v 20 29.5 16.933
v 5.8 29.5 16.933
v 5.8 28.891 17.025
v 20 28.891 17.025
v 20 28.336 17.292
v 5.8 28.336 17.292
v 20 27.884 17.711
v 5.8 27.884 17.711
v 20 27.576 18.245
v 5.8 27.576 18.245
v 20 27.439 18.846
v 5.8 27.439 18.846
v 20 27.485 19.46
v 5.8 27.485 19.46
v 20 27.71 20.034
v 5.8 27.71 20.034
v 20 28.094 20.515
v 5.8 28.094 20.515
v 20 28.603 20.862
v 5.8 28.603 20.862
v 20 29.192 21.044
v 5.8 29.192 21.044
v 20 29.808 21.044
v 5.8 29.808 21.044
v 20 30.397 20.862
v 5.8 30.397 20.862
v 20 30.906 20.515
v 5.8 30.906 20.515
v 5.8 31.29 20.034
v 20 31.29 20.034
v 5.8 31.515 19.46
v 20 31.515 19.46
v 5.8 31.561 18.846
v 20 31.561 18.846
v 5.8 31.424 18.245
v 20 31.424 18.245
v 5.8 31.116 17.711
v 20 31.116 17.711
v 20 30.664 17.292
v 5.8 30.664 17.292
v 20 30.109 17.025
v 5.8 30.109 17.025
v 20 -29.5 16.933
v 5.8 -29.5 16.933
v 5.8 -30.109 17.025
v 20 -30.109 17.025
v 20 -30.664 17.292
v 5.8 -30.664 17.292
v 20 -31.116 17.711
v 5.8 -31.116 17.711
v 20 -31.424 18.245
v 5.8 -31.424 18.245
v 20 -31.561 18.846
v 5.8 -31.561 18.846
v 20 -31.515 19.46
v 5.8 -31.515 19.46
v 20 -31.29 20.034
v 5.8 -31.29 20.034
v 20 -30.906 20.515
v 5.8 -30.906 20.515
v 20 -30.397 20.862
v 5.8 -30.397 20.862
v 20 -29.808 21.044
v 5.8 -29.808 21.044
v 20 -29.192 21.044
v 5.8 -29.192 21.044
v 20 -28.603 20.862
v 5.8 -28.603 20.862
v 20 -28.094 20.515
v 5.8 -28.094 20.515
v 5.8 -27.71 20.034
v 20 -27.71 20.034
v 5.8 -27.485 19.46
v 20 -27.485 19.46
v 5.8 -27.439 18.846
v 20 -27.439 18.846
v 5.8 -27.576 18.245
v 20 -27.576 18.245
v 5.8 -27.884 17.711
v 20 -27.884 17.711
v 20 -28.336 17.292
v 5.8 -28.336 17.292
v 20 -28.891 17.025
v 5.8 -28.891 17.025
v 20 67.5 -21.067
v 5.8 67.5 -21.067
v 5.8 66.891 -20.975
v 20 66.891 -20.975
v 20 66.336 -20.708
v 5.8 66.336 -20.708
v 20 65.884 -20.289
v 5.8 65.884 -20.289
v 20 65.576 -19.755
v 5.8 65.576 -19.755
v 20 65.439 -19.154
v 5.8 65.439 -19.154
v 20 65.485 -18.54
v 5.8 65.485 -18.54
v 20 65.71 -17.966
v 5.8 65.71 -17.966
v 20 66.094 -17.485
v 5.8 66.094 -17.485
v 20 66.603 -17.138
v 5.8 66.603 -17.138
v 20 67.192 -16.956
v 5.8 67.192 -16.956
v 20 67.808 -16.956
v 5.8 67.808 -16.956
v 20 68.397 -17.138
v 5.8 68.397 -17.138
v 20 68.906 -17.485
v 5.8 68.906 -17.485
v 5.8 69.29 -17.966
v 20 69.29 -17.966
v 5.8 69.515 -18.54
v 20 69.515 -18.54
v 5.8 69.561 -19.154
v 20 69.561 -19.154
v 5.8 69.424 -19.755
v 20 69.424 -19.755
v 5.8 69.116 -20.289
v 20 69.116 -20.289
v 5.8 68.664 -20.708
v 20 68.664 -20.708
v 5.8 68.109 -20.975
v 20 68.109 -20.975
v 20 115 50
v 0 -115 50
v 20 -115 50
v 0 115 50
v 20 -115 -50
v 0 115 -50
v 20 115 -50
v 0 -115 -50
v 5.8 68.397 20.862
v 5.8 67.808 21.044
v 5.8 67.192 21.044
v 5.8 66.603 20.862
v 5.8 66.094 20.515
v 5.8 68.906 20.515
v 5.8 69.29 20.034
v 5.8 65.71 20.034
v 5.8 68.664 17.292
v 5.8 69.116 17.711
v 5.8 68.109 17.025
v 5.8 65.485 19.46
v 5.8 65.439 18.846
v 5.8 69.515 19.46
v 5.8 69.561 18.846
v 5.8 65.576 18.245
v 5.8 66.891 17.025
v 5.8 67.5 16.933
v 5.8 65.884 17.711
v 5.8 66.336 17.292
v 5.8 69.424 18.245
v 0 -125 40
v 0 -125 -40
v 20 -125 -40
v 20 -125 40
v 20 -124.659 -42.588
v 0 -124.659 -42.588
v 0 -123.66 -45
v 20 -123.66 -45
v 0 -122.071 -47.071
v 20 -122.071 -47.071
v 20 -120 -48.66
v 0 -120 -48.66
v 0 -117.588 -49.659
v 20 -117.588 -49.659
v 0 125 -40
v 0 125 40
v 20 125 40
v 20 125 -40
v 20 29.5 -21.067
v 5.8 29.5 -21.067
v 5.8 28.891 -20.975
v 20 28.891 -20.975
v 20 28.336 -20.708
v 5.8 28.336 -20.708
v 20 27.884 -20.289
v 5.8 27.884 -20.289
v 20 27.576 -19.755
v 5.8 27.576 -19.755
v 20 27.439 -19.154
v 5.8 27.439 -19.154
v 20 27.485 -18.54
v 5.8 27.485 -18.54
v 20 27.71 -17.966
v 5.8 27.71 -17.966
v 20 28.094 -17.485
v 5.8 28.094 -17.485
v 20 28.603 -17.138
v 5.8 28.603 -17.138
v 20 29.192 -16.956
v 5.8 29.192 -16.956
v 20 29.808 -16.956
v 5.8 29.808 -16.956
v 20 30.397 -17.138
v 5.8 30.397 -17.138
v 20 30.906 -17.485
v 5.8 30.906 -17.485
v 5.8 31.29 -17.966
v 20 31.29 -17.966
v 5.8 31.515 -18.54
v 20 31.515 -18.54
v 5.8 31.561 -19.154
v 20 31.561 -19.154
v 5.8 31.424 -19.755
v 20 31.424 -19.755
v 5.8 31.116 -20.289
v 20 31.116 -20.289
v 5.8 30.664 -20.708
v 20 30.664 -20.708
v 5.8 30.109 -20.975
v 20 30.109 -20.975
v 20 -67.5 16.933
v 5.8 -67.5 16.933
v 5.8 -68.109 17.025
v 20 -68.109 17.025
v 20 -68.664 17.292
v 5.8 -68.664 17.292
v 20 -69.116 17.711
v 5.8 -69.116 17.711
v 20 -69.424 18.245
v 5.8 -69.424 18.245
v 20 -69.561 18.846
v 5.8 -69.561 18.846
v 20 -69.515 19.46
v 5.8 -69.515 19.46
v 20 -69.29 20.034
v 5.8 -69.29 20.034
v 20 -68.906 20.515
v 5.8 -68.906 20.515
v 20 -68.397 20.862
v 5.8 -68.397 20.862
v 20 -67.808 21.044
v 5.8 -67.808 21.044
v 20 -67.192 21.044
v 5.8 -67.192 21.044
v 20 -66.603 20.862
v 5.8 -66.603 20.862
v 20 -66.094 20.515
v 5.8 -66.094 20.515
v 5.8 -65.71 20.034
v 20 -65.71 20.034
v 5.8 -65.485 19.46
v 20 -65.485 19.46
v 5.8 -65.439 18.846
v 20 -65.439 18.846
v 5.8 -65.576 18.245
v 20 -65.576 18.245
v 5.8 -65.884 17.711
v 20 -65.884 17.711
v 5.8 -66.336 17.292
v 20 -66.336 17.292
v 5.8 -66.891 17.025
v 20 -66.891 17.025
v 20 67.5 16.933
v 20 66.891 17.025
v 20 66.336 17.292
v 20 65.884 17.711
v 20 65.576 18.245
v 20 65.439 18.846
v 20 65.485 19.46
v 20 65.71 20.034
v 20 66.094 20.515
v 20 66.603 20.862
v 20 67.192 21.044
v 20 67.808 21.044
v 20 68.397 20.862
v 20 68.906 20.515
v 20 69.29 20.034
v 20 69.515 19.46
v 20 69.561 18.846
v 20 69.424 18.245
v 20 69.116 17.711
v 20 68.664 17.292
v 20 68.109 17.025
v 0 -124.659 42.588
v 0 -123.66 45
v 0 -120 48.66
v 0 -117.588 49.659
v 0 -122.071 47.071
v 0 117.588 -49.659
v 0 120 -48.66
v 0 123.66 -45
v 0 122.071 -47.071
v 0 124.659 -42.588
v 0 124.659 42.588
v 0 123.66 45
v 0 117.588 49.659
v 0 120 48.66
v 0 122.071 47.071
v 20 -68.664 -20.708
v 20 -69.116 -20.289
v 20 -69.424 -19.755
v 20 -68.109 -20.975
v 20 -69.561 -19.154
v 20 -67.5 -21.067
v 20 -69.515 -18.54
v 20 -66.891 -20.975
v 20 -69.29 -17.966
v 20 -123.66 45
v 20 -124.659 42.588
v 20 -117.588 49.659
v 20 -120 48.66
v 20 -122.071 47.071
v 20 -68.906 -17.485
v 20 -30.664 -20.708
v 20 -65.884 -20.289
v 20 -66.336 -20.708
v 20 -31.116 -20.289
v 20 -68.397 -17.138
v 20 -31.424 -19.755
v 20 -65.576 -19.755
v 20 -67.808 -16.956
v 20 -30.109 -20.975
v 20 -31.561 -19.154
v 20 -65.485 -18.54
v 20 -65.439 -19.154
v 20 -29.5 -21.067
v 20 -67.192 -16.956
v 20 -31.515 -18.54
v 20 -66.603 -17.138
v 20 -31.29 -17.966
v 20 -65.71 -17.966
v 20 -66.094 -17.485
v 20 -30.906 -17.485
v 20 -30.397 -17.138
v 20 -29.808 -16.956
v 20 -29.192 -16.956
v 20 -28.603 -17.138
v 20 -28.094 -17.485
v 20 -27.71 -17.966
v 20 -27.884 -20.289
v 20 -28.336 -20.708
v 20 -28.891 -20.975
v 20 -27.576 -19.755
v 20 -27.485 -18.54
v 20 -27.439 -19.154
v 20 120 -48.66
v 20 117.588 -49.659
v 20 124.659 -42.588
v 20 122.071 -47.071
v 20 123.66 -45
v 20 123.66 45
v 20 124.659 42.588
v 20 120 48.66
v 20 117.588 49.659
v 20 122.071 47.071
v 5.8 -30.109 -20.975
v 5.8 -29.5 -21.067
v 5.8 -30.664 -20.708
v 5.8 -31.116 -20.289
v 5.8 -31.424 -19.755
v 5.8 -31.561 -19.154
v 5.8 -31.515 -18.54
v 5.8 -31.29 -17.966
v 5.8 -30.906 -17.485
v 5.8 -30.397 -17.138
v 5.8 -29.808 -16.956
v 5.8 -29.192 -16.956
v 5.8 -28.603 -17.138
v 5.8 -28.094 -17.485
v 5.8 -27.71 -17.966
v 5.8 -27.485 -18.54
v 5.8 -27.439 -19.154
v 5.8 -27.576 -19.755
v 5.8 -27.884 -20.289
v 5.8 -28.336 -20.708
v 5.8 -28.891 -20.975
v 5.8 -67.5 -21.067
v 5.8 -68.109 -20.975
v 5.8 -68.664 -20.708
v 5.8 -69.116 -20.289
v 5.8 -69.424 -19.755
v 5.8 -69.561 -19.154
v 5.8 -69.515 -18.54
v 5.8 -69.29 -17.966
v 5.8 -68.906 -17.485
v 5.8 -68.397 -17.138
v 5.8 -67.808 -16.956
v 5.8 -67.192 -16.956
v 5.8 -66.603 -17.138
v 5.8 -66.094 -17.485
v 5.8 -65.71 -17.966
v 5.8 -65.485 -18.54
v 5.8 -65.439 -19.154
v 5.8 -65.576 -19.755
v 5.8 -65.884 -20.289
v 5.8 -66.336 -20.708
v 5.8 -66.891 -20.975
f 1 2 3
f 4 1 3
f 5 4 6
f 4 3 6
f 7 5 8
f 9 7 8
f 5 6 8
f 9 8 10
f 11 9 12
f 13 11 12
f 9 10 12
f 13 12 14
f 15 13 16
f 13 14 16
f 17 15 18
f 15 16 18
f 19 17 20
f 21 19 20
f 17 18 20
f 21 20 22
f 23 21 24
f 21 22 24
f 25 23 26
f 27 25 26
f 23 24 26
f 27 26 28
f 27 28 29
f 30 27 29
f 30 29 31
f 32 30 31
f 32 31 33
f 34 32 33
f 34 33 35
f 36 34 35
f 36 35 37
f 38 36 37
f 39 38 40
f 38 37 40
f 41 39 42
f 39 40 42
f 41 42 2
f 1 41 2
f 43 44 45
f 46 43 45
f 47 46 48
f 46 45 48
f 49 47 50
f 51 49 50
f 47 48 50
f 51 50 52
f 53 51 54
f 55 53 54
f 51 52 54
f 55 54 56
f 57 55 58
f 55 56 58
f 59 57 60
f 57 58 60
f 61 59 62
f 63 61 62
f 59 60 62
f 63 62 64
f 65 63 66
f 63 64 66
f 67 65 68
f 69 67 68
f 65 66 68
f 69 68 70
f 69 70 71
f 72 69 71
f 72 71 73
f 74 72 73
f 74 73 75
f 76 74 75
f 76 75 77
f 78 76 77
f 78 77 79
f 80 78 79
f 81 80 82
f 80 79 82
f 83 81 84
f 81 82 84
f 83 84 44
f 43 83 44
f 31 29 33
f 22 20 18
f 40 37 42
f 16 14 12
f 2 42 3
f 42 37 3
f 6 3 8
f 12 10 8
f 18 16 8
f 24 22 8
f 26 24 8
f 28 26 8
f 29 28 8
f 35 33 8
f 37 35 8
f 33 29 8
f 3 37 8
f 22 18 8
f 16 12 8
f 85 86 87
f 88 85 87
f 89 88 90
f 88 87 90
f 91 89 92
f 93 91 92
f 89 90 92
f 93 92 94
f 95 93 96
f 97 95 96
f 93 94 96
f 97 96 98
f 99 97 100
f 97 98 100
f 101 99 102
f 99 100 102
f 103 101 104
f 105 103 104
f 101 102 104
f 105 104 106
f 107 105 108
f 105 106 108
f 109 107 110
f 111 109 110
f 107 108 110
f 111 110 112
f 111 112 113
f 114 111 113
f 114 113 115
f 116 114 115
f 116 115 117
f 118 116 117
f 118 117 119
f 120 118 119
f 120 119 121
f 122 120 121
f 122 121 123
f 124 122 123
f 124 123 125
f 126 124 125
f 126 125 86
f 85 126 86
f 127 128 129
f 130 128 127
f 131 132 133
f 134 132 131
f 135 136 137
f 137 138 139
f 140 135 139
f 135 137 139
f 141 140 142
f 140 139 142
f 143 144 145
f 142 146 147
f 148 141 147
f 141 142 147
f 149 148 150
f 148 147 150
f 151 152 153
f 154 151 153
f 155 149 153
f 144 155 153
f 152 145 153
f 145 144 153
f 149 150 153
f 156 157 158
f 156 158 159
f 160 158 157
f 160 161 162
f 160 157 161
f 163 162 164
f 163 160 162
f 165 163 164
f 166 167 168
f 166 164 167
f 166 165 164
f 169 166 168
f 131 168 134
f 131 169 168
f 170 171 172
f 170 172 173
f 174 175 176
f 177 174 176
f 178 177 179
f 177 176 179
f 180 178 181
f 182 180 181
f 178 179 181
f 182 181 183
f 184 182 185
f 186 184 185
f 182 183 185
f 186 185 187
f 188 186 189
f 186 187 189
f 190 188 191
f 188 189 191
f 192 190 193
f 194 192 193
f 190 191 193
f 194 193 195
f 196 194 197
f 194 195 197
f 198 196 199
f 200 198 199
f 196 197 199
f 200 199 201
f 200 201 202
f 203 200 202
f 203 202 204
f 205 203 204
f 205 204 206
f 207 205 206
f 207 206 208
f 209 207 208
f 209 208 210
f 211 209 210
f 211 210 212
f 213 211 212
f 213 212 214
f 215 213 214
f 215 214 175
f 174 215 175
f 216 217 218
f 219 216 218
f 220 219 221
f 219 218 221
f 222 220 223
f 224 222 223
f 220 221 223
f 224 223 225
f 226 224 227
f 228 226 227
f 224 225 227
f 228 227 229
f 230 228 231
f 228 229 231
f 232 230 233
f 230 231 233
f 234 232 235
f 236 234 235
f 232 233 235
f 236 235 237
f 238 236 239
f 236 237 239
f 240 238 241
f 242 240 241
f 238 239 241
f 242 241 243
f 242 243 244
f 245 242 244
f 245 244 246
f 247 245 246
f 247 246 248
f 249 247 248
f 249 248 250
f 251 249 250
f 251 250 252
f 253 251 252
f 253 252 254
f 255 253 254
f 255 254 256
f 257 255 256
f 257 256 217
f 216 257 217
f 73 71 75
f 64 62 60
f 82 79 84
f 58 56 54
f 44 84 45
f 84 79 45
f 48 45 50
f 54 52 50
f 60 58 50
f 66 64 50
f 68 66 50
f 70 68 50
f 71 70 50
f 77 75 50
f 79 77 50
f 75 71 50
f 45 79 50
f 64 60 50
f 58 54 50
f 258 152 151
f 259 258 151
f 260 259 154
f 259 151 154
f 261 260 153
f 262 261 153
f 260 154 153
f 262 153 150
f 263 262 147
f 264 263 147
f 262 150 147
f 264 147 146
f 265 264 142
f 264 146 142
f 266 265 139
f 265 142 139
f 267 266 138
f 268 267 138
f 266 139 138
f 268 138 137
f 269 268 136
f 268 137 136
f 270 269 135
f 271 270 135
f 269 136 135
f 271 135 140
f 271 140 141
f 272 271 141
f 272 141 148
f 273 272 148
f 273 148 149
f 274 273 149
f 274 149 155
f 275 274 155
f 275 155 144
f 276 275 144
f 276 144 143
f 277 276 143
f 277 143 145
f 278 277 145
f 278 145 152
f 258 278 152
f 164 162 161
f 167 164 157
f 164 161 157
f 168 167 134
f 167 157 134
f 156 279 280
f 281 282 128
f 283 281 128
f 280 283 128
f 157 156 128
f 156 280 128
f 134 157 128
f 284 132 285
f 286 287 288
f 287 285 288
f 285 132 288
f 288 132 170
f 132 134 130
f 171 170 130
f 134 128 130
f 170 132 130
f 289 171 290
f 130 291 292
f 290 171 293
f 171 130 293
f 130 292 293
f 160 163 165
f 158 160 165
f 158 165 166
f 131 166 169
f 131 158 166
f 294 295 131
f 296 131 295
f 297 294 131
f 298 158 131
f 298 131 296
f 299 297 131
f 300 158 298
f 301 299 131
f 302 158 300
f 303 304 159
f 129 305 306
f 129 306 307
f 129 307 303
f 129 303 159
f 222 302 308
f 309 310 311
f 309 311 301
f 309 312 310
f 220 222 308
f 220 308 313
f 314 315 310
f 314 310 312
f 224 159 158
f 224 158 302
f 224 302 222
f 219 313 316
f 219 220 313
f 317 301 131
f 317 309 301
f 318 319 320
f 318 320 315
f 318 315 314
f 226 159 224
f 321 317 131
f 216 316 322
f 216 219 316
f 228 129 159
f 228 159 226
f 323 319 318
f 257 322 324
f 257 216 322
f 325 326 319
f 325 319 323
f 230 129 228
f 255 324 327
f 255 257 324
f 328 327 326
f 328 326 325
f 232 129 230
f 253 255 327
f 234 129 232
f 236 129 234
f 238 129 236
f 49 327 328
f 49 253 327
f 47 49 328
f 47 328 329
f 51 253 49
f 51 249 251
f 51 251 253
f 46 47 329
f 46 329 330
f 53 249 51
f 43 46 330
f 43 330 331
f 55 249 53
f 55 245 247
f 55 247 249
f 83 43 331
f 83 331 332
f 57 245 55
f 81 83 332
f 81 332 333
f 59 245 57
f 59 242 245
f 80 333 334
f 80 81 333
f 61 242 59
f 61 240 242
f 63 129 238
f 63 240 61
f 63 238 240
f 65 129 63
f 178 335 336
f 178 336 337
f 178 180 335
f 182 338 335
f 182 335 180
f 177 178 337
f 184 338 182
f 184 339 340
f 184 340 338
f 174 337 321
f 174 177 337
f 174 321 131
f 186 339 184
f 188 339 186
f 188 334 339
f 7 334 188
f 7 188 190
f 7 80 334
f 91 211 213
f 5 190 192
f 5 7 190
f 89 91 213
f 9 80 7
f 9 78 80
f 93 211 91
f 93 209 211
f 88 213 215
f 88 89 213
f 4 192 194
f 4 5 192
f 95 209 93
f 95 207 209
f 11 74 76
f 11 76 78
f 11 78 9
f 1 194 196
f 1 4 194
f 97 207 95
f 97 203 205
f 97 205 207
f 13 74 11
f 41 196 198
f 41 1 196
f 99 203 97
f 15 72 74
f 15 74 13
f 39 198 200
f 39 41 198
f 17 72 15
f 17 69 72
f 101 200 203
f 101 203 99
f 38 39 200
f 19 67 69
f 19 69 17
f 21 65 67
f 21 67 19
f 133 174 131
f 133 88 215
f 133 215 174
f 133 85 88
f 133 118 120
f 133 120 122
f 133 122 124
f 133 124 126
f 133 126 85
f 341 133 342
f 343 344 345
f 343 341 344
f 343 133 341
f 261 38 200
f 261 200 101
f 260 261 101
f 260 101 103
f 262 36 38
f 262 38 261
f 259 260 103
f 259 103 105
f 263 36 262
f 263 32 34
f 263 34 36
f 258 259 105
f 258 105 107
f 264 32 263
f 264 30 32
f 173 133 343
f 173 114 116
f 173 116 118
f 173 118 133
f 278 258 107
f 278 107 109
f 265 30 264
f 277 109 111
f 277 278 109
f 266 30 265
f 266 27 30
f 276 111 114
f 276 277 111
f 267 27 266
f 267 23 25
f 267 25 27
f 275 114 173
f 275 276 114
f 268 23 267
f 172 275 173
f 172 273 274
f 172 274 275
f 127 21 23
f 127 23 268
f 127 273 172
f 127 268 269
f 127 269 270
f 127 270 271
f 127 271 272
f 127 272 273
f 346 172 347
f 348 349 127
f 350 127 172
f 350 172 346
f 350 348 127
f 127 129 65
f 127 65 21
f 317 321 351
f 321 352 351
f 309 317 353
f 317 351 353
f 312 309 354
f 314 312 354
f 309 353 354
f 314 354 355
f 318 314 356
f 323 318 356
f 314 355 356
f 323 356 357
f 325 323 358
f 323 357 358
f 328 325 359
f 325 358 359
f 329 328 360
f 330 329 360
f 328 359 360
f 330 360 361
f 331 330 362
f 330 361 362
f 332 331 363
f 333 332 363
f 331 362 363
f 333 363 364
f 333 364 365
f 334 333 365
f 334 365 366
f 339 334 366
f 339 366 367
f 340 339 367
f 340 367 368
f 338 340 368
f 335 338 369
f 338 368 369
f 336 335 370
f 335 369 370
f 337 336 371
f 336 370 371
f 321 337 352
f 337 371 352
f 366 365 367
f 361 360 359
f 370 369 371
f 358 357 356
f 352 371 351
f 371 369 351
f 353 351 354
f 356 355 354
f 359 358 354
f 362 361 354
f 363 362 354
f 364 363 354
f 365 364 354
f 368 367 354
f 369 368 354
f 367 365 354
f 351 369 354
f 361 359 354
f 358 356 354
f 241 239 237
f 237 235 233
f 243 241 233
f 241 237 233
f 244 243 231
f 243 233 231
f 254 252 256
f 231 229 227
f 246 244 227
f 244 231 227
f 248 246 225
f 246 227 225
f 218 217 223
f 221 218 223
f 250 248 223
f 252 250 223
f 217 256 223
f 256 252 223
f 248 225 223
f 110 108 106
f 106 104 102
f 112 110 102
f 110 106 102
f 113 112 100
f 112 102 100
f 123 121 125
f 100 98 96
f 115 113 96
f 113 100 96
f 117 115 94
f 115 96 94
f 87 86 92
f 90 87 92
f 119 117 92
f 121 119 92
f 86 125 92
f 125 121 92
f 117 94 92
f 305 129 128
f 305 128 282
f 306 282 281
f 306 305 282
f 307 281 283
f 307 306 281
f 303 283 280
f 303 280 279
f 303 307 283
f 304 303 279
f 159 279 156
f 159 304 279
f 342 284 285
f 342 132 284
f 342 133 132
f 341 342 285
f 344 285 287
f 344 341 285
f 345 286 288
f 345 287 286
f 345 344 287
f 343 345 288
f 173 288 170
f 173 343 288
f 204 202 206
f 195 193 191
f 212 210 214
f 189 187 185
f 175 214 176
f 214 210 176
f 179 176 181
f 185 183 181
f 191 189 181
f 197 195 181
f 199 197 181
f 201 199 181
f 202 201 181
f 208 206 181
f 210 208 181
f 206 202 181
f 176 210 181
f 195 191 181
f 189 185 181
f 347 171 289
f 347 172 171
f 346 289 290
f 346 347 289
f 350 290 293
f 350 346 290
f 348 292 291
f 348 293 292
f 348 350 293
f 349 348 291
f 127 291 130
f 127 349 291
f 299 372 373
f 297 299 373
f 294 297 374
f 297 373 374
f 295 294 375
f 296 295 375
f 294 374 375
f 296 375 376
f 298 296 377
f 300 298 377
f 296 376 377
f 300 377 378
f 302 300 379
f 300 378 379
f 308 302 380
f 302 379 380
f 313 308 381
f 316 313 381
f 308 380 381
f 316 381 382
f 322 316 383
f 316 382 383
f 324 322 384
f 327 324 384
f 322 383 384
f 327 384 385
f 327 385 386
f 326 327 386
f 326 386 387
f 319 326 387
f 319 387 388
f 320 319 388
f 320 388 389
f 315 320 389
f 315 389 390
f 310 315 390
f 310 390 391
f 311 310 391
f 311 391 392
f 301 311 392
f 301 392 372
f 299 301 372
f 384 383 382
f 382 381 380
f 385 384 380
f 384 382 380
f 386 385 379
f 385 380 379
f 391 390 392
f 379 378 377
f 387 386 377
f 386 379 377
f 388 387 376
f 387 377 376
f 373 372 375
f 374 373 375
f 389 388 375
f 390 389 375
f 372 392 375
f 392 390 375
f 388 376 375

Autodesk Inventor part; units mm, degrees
ref_plane "YZ Plane" through (0, 0, 0) normal (1, 0, 0) x (0, 1, 0)
ref_plane "XZ Plane" through (0, 0, 0) normal (0, 1, 0) x (-1, 0, 0)
ref_plane "XY Plane" through (0, 0, 0) normal (0, 0, 1) x (1, 0, 0)
sketch "Skizze1" plane through (0, 0, 0) normal (1, 0, 0) x (0, 1, 0)
  line L0 (-125, 50) -> (125, 50)
  line L1 (125, 50) -> (125, -50)
  line L2 (125, -50) -> (-125, -50)
  line L3 (-125, -50) -> (-125, 50)
  line L4 (-125, 50) -> (125, -50) construction
  line L5 (125, 50) -> (-125, -50) construction
  point P0 (0, 0)
  dimension "d0" = 250
  dimension "d1" = 100
extrude "Extrusion1" add sketch "Skizze1" along normal blind 20
sketch "Skizze2" plane through (20, 0, 0) normal (1, 0, 0) x (0, 0, -1)
  line L0 (25, -23.5) -> (-25, -23.5)
  line L1 (-25, -23.5) -> (-25, -73.5)
  line L2 (-25, -73.5) -> (25, -73.5)
  line L3 (25, -73.5) -> (25, -23.5)
  line L4 (25, -23.5) -> (-25, -73.5) construction
  line L5 (-25, -23.5) -> (25, -73.5) construction
  line L6 (25, 73.5) -> (-25, 73.5)
  line L7 (-25, 73.5) -> (-25, 23.5)
  line L8 (-25, 23.5) -> (25, 23.5)
  line L9 (25, 23.5) -> (25, 73.5)
  line L10 (25, 73.5) -> (-25, 23.5) construction
  line L11 (-25, 73.5) -> (25, 23.5) construction
  point P0 (0, 0)
  point P1 (0, -48.5)
  point P2 (0, 48.5)
  point P3 (-19, -67.5)
  point P4 (-19, -29.5)
  point P5 (19, -29.5)
  point P6 (19, -67.5)
  point P7 (19, 29.5)
  point P8 (19, 67.5)
  point P9 (-19, 67.5)
  point P10 (-19, 29.5)
  dimension "d4" = 50
  dimension "d5" = 50
  dimension "d6" = 50
  dimension "d7" = 50
  dimension "d8" = 97
  dimension "d10" = 48.5
  dimension "d11" = 0
  dimension "d13" = 6
  dimension "d14" = 6
  dimension "d15" = 6
  dimension "d16" = 6
  dimension "d17" = 6
  dimension "d18" = 6
  dimension "d19" = 6
  dimension "d20" = 6
fillet "Rundung1" radius 10 4 edges at (10, -125, 50) (10, -125, -50) (10, 125, -50) (10, 125, 50)
hole "Bohrung1" at (20, -67.5, 19) at (20, -29.5, 19) at (20, -29.5, -19) at (20, -67.5, -19) at (20, 29.5, -19) at (20, 67.5, -19) at (20, 67.5, 19) at (20, 29.5, 19) direction (-1, 0, 0) diameter 4.134 depth 14.2 thread size "M5x0.8" class "6H" standard "ANSI Metric M Profile"
equation "\"d22\" = d19"
properties part number "Gehäuse festigung platte" material "Aluminium 6061"
